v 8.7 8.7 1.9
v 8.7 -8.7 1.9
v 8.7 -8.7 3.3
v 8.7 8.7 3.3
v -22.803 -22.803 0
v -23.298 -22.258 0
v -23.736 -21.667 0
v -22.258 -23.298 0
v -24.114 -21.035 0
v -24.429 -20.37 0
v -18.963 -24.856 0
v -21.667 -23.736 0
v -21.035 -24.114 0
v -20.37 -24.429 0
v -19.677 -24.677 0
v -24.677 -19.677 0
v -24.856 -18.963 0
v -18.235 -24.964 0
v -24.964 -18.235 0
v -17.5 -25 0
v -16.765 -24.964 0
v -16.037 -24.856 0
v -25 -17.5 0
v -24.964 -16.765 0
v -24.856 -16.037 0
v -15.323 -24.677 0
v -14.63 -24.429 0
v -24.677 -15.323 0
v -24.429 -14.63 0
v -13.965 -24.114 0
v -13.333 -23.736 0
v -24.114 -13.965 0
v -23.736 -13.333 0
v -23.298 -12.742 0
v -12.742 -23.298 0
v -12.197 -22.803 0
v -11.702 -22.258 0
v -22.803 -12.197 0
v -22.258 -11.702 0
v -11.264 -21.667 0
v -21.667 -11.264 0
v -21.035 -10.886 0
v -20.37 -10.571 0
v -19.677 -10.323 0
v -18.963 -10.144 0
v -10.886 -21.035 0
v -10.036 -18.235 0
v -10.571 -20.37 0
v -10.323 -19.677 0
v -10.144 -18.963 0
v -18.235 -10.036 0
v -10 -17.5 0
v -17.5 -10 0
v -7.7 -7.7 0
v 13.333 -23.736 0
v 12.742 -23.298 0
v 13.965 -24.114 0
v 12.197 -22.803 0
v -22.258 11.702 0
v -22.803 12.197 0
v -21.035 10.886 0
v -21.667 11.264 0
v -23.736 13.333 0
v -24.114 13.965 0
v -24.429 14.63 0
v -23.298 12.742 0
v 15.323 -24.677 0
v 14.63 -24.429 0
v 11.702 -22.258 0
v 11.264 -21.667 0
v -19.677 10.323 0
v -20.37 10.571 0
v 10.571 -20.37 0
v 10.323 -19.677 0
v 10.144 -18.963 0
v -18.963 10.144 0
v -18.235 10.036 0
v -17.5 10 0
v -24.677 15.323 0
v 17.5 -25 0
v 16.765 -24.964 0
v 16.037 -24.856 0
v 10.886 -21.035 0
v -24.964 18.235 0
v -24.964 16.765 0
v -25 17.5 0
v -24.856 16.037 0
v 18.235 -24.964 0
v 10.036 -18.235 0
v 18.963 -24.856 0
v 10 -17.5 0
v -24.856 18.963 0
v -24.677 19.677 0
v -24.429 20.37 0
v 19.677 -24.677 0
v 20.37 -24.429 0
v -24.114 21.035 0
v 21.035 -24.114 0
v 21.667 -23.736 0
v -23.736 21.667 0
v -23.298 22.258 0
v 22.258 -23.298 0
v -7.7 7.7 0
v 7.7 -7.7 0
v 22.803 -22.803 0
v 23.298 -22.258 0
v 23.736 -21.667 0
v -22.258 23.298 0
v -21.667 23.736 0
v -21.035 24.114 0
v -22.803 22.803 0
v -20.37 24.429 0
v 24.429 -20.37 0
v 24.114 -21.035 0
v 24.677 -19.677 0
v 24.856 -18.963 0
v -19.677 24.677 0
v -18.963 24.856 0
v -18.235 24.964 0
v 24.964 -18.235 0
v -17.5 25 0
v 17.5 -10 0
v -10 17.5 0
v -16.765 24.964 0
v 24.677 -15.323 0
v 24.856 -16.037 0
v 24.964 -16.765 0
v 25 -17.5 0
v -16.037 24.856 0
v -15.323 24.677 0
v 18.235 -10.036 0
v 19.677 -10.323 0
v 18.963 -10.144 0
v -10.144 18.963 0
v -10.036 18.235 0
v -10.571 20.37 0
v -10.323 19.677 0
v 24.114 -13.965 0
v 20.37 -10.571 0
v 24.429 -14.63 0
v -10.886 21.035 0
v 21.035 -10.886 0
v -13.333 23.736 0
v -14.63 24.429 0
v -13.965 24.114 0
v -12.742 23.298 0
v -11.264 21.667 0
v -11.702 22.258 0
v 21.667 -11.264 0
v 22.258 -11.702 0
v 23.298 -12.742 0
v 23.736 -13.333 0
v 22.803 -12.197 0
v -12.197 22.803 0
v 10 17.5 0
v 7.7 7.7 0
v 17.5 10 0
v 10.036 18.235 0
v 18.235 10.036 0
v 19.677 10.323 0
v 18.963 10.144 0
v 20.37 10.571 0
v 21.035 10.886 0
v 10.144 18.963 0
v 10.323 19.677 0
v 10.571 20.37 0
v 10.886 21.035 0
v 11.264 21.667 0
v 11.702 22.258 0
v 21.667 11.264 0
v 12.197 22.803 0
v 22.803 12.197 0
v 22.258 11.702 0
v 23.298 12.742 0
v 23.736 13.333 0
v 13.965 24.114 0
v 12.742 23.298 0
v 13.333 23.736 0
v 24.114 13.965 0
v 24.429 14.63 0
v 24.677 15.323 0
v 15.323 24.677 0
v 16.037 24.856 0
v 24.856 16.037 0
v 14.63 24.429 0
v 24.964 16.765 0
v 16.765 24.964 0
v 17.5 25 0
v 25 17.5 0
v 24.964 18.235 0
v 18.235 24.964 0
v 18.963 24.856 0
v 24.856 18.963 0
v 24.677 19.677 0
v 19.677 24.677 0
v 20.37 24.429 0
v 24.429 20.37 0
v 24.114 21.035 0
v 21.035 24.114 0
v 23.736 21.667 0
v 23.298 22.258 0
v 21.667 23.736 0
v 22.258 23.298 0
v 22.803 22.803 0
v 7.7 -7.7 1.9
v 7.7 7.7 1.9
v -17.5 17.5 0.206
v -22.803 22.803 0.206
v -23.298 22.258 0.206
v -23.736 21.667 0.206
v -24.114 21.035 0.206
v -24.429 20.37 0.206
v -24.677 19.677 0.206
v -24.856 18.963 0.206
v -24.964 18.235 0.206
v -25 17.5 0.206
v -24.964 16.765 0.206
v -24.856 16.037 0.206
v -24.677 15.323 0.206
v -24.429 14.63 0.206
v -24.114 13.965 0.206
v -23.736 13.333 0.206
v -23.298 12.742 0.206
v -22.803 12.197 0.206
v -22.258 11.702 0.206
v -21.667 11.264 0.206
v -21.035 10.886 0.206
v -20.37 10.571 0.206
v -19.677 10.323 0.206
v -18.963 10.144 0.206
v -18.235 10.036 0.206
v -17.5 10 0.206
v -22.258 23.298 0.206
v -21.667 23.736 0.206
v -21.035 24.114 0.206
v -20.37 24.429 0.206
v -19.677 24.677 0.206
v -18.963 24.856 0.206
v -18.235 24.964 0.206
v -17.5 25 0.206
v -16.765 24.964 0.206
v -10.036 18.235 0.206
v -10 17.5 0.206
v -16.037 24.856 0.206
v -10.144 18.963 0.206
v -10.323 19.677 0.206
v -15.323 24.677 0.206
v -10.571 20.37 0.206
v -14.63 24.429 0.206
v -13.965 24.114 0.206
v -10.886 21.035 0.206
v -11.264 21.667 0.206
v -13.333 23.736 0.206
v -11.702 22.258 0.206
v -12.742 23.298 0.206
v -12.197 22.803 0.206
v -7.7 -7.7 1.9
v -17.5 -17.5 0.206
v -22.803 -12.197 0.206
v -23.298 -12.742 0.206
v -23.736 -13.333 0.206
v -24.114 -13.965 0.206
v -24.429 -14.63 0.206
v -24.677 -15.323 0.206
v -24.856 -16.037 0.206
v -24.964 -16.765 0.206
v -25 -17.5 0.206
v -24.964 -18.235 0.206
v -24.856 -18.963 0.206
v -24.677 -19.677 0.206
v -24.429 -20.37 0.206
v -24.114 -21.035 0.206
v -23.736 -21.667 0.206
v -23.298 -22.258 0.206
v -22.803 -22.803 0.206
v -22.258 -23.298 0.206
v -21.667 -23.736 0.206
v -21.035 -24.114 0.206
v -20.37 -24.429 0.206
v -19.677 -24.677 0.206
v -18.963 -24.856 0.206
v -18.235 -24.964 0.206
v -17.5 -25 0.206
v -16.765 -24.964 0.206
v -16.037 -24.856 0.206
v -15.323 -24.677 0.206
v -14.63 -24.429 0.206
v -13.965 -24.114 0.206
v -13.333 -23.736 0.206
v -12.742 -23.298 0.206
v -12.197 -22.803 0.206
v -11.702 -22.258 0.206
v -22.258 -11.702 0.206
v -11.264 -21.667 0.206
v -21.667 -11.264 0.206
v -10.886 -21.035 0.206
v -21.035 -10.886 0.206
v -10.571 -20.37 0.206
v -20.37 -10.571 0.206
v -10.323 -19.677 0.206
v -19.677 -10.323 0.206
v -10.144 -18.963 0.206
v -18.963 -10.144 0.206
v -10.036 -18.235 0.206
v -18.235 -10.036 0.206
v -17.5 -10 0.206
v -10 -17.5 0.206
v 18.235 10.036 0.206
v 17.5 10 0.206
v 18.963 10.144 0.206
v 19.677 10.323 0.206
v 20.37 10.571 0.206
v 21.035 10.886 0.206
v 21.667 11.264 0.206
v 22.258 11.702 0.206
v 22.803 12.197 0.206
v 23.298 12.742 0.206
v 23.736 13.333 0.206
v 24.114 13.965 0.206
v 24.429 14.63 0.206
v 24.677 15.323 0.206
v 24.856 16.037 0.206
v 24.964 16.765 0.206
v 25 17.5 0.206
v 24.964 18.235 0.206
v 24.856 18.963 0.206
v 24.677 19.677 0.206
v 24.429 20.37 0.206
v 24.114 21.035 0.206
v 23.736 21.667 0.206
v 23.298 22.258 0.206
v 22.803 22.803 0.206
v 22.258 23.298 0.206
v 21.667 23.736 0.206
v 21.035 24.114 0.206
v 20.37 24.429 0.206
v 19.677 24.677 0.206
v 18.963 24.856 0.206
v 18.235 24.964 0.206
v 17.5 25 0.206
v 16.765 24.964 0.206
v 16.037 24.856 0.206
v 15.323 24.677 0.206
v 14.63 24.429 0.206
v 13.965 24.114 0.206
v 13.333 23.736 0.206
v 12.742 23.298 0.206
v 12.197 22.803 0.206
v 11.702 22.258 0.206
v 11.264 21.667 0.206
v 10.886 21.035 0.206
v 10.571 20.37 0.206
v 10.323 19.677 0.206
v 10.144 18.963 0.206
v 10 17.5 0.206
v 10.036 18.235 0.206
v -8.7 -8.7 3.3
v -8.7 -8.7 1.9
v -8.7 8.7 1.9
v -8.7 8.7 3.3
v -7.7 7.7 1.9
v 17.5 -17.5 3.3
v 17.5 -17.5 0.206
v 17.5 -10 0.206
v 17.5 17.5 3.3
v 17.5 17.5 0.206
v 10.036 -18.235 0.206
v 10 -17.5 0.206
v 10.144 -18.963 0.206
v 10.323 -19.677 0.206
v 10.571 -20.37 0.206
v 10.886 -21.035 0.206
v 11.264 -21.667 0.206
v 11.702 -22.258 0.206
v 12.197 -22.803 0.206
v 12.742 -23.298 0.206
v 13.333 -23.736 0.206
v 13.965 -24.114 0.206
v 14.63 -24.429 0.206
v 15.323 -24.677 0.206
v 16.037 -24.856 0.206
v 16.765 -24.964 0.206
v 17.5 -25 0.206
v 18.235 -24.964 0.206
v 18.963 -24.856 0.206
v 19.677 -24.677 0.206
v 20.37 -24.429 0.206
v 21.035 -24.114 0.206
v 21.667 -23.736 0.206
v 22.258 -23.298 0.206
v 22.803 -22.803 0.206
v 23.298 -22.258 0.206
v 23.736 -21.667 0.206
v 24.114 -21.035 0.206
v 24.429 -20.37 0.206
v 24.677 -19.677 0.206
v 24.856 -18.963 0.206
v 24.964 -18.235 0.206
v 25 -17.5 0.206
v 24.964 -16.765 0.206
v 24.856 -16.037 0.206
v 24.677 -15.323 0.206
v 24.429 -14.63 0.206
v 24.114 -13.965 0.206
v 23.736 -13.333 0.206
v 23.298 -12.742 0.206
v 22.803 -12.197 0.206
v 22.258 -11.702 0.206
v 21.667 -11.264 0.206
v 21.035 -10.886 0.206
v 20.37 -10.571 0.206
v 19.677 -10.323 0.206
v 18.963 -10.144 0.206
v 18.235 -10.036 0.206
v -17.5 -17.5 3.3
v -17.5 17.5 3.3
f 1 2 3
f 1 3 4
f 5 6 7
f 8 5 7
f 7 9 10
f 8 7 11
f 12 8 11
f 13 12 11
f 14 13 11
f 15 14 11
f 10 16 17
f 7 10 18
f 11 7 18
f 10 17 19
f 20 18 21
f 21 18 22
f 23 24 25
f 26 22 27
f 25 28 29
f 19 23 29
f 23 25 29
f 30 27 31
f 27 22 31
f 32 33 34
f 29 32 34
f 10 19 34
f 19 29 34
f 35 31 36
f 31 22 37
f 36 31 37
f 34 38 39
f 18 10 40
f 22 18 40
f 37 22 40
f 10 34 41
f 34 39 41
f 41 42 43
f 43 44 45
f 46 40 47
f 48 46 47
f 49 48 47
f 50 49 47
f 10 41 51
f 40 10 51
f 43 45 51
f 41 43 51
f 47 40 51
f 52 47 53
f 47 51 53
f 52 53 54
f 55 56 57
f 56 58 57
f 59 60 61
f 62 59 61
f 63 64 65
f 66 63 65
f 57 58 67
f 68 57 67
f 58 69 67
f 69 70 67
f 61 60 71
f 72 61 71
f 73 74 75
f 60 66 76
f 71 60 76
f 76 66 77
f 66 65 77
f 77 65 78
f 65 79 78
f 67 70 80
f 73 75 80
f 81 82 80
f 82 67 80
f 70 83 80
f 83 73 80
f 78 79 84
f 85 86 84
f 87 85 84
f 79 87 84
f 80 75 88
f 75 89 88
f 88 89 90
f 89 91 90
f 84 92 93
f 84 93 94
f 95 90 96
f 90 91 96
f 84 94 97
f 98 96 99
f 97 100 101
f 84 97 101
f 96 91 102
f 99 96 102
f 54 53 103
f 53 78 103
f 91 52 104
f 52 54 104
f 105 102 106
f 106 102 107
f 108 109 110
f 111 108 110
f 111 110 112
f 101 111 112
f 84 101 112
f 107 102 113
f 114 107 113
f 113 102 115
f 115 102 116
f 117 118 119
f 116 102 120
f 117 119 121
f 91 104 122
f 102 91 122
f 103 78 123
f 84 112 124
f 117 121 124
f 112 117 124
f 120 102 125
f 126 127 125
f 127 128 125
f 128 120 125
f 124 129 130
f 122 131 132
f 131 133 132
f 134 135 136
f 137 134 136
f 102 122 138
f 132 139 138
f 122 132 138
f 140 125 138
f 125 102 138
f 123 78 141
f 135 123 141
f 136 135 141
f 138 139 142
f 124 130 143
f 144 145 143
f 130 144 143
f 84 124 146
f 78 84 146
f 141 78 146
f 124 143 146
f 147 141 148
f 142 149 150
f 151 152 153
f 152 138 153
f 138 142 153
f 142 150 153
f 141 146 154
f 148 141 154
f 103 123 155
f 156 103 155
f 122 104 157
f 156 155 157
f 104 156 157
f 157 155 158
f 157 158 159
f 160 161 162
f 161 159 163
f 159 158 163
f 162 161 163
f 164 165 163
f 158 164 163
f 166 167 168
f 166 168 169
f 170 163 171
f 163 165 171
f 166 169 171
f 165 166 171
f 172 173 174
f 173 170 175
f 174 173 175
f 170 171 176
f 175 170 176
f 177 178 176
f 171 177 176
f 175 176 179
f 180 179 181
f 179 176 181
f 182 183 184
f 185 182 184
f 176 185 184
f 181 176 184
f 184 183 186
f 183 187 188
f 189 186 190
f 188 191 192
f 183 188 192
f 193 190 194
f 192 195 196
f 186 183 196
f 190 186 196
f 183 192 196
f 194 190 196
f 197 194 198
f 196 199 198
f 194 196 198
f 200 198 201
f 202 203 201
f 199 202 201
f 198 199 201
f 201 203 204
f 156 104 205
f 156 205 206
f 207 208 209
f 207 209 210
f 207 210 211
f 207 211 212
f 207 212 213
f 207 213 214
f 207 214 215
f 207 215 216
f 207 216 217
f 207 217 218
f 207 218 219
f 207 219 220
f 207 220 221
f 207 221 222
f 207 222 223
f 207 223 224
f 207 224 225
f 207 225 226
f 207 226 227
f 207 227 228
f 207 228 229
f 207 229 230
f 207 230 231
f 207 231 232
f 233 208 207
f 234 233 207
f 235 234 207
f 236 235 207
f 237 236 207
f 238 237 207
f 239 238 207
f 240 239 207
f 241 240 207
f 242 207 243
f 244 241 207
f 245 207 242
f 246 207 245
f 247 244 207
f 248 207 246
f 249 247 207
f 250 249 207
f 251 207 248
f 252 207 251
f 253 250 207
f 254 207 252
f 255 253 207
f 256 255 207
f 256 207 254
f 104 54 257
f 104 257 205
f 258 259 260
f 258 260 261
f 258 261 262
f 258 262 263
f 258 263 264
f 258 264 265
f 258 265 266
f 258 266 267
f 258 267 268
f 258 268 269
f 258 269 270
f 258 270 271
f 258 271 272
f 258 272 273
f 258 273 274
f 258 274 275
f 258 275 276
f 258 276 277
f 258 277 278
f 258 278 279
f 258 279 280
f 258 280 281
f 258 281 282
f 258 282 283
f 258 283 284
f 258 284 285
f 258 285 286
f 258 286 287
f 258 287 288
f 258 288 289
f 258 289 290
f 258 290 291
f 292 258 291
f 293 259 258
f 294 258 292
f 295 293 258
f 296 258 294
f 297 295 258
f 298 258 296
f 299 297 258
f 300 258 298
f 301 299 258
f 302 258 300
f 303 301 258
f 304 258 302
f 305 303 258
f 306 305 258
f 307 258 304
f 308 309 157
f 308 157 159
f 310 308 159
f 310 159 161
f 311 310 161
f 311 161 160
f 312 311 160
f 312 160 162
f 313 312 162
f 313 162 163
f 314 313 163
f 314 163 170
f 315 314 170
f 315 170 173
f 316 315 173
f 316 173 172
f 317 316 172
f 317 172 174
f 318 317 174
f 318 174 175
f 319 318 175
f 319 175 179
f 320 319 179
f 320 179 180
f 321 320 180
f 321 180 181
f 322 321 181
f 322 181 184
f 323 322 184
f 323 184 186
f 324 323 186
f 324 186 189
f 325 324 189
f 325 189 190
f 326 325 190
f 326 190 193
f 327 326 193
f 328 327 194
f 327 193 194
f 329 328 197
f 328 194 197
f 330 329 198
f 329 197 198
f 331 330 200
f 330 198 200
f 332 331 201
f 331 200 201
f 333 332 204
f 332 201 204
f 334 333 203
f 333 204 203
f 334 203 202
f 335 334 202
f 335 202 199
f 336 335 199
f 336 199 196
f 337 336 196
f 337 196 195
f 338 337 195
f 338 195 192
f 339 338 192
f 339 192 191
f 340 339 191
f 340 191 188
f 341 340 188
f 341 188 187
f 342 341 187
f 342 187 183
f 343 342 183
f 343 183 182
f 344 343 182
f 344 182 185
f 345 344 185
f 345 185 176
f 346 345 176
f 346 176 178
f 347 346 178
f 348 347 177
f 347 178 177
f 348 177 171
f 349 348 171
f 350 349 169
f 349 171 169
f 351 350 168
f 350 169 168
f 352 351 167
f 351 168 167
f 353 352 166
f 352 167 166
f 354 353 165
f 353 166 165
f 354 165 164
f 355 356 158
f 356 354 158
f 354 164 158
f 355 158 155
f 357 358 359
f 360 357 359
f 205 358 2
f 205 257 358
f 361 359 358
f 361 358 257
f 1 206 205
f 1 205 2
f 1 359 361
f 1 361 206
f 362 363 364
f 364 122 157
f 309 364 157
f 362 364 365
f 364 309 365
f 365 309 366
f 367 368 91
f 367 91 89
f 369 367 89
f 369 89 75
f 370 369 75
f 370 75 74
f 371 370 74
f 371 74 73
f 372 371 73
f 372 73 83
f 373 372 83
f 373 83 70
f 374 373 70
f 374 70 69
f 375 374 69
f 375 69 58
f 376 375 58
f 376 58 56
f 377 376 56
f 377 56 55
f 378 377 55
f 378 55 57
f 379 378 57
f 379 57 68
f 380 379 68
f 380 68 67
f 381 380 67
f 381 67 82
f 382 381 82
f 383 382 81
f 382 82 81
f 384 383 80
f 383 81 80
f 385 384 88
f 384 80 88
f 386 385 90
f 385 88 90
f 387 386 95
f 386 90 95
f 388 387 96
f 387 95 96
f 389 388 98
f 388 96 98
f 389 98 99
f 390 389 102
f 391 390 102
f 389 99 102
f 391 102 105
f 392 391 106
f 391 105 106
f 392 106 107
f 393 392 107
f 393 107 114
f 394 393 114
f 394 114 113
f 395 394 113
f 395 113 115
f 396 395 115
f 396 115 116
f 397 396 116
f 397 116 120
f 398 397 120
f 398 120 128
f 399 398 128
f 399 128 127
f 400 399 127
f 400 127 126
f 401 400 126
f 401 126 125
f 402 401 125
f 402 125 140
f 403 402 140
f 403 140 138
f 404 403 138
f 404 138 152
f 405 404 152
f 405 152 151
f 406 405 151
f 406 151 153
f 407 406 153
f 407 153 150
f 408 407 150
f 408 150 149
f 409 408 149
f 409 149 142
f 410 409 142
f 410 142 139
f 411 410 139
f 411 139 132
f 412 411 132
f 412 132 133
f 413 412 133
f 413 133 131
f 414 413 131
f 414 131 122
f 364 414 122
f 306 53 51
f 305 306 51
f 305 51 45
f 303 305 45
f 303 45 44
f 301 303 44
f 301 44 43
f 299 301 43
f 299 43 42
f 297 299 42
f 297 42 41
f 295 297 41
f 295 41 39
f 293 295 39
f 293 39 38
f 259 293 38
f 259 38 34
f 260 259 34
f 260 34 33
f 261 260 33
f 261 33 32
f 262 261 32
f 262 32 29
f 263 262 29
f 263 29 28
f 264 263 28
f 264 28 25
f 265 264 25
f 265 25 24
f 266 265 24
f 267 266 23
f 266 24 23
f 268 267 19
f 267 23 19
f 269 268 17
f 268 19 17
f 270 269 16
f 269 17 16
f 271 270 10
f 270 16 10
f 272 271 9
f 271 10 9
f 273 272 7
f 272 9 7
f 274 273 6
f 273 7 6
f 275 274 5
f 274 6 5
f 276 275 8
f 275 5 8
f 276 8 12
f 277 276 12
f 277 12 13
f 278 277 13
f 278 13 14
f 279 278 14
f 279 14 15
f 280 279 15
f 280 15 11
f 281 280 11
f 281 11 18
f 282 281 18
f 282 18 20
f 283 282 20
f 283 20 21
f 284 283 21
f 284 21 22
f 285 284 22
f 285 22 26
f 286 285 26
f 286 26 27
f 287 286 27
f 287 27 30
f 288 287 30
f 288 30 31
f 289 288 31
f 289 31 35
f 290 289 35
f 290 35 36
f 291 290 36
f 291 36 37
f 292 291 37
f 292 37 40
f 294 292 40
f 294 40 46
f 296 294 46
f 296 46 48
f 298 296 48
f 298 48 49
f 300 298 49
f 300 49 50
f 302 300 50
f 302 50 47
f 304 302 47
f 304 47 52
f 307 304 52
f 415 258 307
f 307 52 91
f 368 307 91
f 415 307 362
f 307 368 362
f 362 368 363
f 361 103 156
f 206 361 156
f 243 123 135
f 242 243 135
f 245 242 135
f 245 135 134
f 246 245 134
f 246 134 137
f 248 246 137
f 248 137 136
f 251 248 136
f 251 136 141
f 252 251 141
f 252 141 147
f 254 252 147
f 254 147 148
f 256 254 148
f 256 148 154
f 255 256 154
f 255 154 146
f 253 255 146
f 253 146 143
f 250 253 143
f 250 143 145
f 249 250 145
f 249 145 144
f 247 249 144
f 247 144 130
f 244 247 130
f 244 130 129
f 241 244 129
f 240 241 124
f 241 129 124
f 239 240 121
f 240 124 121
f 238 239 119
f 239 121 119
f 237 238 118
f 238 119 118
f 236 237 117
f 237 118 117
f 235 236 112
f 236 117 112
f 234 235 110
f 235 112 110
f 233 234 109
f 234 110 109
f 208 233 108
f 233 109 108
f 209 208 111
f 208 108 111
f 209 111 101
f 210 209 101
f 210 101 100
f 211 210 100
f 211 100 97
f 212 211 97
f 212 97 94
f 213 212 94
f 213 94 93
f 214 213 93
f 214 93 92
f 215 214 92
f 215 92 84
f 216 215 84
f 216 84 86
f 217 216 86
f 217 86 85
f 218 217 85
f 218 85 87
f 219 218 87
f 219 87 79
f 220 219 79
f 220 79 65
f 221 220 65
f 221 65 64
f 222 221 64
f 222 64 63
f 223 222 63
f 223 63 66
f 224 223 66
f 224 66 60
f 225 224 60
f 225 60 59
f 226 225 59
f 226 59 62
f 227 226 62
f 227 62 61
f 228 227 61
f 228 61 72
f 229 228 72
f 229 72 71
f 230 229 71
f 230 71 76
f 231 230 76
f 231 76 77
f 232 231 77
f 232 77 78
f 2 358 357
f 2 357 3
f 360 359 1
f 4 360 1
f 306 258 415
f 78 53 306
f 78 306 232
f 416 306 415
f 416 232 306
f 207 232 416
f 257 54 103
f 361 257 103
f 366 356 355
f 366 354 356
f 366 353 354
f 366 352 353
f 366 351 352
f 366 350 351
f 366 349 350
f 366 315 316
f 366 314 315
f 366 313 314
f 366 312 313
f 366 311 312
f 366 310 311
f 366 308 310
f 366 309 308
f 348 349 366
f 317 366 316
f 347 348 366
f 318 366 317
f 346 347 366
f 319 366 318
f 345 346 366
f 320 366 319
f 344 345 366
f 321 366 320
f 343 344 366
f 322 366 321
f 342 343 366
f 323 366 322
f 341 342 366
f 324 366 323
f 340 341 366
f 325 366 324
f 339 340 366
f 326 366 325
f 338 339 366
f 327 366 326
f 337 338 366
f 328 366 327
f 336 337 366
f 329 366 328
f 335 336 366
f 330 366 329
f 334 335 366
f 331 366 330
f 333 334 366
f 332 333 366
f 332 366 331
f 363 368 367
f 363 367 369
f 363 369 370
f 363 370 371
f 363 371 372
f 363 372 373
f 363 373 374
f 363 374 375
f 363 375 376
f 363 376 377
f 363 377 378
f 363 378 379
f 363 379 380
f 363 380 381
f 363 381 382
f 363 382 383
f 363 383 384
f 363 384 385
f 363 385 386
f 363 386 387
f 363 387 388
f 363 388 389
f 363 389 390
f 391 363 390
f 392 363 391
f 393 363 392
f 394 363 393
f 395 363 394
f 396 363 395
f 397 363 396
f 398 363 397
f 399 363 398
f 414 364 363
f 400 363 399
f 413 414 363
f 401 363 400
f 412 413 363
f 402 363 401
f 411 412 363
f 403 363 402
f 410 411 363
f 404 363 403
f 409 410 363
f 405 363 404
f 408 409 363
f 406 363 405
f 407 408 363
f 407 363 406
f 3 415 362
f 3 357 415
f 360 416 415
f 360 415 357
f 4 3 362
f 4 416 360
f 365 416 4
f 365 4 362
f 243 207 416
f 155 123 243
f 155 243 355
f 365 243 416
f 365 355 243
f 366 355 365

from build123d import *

# Parameters (mm, degrees)
F0_W     = 17.4
F0_H     = 17.4
F0_W_2   = 15.4
F0_H_2   = 15.4
F5_DEPTH = 1.9
F0_W_3   = 35
F0_H_3   = 35
F1_DEPTH = 1.9
F2_DEPTH = 1.4
F3_R     = 7.5
F4_DEPTH = 0.2064


with BuildPart() as f5:
    # F0 (on Top) → F5 (new body)
    with BuildSketch(Plane.XY):
        Rectangle(F0_W, F0_H)
        Rectangle(F0_W_2, F0_H_2, mode=Mode.SUBTRACT)
    extrude(amount=F5_DEPTH)



with BuildPart() as f1:
    # F0 (on Top) → F1 (new body, through all)
    with BuildSketch(Plane.XY):
        Rectangle(F0_W_3, F0_H_3)
        Rectangle(F0_W, F0_H, mode=Mode.SUBTRACT)
    extrude(amount=F1_DEPTH)


with BuildPart() as f5_1:
    add(f5.part)
    # F2 (add): a face of the model
    f2_faces = [f1.part.faces().sort_by_distance(p)[0] for p in [
        (17.0050252532, 0, 1.9),
    ]]

    add(f1.part)  # F2 merges F1
    extrude(f2_faces, amount=F2_DEPTH)

    # F3 (on Top) → F4 (join)
    with BuildSketch(Plane.XY):
        with Locations((17.5, 17.5)):
            Circle(F3_R)
        with Locations((-17.5, 17.5)):
            Circle(F3_R)
        with Locations((-17.5, -17.5)):
            Circle(F3_R)
        with Locations((17.5, -17.5)):
            Circle(F3_R)
    extrude(amount=F4_DEPTH)


solid = f5_1.part
